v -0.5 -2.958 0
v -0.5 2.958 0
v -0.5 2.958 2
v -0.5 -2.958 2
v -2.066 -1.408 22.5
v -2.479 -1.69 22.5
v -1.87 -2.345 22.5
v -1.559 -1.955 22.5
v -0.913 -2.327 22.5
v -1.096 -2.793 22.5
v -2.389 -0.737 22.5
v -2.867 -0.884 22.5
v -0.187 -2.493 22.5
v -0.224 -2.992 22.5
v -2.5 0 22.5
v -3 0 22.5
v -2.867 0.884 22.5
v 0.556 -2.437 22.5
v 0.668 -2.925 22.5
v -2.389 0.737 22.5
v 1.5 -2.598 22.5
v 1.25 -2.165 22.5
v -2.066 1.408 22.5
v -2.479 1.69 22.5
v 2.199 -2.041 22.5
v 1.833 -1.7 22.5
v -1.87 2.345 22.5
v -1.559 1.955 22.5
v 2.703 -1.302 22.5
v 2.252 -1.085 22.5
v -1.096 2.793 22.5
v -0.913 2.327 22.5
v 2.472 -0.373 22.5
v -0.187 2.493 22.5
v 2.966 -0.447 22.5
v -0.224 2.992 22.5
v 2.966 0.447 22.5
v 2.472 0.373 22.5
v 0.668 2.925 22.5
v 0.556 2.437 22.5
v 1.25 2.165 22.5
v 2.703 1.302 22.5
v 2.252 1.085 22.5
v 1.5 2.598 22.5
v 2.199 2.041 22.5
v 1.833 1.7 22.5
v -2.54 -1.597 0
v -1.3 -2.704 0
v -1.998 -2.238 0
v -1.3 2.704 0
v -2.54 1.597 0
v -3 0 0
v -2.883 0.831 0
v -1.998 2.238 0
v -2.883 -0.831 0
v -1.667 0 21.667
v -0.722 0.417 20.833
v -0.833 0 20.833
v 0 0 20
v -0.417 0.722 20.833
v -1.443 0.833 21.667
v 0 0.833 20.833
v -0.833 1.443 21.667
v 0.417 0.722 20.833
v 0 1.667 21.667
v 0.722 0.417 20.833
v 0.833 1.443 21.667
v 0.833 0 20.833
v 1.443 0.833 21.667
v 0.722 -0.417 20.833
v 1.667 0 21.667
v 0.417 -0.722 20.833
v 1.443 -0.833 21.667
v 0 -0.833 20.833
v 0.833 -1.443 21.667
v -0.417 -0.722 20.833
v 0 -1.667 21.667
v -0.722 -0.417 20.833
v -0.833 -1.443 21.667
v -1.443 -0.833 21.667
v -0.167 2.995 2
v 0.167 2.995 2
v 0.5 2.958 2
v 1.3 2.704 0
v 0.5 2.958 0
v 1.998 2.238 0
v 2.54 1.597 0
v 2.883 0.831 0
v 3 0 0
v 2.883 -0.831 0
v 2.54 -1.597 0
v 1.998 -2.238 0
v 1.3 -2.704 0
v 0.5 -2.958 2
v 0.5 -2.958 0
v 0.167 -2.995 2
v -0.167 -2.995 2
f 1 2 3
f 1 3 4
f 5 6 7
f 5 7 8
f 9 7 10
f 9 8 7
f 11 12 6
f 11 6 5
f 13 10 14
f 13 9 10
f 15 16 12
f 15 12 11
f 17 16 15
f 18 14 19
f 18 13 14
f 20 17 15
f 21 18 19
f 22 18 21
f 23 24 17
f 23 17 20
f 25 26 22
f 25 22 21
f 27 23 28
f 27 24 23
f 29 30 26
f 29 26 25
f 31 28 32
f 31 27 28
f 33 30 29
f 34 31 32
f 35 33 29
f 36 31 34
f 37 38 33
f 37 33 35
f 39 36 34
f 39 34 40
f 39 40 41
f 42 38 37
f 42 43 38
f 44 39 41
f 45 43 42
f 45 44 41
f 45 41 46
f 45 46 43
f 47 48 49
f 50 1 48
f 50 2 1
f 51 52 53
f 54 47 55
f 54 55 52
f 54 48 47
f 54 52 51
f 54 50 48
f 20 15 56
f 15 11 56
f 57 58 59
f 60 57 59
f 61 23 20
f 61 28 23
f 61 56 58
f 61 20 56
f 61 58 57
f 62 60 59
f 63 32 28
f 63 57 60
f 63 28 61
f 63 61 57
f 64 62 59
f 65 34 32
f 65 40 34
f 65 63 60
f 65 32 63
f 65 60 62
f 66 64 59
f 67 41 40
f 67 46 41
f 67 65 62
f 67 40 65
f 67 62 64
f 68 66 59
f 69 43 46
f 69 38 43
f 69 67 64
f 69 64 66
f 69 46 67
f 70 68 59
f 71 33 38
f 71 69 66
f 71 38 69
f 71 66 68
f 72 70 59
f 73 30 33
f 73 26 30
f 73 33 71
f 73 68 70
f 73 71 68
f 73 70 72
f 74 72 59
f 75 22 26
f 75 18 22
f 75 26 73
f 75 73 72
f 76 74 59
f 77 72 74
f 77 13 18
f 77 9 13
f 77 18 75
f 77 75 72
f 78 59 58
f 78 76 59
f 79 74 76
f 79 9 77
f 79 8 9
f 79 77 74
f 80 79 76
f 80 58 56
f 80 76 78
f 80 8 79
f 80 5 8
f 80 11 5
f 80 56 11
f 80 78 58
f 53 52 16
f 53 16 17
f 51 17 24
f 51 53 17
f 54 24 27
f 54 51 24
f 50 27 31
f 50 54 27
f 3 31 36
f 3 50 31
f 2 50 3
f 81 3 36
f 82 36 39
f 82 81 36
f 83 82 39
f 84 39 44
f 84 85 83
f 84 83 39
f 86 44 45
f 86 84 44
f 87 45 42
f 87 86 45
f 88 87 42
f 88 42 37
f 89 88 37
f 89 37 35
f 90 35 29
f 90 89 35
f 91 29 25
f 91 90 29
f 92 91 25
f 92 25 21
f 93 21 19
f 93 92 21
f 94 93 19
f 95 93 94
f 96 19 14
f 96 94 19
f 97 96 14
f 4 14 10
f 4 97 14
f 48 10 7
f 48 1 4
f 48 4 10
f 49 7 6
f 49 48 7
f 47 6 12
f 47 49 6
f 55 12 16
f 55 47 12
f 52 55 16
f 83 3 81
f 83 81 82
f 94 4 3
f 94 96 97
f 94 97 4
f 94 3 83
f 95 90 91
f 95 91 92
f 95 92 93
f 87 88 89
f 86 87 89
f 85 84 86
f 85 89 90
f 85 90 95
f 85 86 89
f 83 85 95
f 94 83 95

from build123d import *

# Parameters (mm, degrees)
F2_W     = 1
F2_H     = 9.471692
F3_DEPTH = 2


with BuildPart() as f1:
    # F0 (on Front) → F1 (revolve)
    with BuildSketch(Plane.XZ):
        Polygon((-3, 0), (0, 0), (0, 20), (-2.5, 22.5), (-3, 22.5), align=None)
    revolve(axis=Axis((0, 0, 10), (0, 0, -1)))

    # F2 (on face) → F3 (cut)
    with BuildSketch(Plane(origin=(0, 0, 0), x_dir=(1, 0, 0), z_dir=(0, 0, -1))):
        Rectangle(F2_W, F2_H)
    extrude(amount=-F3_DEPTH, mode=Mode.SUBTRACT)


solid = f1.part
